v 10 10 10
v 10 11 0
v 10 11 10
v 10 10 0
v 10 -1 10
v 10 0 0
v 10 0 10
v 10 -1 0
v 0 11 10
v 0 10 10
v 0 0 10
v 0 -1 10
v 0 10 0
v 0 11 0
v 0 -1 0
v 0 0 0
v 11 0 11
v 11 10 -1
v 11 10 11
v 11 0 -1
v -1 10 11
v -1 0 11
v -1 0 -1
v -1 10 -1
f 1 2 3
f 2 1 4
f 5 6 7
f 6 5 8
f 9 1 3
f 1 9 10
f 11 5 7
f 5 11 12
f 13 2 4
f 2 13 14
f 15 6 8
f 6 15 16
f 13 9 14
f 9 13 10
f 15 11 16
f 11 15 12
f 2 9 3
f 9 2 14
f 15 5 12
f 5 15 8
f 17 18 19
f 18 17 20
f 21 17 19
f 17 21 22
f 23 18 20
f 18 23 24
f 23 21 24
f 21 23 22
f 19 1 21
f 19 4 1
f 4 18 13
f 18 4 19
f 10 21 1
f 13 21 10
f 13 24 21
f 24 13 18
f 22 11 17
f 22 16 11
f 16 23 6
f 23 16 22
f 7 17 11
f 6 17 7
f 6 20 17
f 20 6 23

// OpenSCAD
// Unit of length: Unit.MM
union()
{
   color(c = [1.0, 0.0, 0.0, 1.0])
   {
      translate(v = [0.0, -1.0, 0.0])
      {
         cube(size = [10.0, 12.0, 10.0], center = false);
      }
   }
   translate(v = [-1.0, 0.0, -1.0])
   {
      cube(size = [12.0, 10.0, 12.0], center = false);
   }
}
